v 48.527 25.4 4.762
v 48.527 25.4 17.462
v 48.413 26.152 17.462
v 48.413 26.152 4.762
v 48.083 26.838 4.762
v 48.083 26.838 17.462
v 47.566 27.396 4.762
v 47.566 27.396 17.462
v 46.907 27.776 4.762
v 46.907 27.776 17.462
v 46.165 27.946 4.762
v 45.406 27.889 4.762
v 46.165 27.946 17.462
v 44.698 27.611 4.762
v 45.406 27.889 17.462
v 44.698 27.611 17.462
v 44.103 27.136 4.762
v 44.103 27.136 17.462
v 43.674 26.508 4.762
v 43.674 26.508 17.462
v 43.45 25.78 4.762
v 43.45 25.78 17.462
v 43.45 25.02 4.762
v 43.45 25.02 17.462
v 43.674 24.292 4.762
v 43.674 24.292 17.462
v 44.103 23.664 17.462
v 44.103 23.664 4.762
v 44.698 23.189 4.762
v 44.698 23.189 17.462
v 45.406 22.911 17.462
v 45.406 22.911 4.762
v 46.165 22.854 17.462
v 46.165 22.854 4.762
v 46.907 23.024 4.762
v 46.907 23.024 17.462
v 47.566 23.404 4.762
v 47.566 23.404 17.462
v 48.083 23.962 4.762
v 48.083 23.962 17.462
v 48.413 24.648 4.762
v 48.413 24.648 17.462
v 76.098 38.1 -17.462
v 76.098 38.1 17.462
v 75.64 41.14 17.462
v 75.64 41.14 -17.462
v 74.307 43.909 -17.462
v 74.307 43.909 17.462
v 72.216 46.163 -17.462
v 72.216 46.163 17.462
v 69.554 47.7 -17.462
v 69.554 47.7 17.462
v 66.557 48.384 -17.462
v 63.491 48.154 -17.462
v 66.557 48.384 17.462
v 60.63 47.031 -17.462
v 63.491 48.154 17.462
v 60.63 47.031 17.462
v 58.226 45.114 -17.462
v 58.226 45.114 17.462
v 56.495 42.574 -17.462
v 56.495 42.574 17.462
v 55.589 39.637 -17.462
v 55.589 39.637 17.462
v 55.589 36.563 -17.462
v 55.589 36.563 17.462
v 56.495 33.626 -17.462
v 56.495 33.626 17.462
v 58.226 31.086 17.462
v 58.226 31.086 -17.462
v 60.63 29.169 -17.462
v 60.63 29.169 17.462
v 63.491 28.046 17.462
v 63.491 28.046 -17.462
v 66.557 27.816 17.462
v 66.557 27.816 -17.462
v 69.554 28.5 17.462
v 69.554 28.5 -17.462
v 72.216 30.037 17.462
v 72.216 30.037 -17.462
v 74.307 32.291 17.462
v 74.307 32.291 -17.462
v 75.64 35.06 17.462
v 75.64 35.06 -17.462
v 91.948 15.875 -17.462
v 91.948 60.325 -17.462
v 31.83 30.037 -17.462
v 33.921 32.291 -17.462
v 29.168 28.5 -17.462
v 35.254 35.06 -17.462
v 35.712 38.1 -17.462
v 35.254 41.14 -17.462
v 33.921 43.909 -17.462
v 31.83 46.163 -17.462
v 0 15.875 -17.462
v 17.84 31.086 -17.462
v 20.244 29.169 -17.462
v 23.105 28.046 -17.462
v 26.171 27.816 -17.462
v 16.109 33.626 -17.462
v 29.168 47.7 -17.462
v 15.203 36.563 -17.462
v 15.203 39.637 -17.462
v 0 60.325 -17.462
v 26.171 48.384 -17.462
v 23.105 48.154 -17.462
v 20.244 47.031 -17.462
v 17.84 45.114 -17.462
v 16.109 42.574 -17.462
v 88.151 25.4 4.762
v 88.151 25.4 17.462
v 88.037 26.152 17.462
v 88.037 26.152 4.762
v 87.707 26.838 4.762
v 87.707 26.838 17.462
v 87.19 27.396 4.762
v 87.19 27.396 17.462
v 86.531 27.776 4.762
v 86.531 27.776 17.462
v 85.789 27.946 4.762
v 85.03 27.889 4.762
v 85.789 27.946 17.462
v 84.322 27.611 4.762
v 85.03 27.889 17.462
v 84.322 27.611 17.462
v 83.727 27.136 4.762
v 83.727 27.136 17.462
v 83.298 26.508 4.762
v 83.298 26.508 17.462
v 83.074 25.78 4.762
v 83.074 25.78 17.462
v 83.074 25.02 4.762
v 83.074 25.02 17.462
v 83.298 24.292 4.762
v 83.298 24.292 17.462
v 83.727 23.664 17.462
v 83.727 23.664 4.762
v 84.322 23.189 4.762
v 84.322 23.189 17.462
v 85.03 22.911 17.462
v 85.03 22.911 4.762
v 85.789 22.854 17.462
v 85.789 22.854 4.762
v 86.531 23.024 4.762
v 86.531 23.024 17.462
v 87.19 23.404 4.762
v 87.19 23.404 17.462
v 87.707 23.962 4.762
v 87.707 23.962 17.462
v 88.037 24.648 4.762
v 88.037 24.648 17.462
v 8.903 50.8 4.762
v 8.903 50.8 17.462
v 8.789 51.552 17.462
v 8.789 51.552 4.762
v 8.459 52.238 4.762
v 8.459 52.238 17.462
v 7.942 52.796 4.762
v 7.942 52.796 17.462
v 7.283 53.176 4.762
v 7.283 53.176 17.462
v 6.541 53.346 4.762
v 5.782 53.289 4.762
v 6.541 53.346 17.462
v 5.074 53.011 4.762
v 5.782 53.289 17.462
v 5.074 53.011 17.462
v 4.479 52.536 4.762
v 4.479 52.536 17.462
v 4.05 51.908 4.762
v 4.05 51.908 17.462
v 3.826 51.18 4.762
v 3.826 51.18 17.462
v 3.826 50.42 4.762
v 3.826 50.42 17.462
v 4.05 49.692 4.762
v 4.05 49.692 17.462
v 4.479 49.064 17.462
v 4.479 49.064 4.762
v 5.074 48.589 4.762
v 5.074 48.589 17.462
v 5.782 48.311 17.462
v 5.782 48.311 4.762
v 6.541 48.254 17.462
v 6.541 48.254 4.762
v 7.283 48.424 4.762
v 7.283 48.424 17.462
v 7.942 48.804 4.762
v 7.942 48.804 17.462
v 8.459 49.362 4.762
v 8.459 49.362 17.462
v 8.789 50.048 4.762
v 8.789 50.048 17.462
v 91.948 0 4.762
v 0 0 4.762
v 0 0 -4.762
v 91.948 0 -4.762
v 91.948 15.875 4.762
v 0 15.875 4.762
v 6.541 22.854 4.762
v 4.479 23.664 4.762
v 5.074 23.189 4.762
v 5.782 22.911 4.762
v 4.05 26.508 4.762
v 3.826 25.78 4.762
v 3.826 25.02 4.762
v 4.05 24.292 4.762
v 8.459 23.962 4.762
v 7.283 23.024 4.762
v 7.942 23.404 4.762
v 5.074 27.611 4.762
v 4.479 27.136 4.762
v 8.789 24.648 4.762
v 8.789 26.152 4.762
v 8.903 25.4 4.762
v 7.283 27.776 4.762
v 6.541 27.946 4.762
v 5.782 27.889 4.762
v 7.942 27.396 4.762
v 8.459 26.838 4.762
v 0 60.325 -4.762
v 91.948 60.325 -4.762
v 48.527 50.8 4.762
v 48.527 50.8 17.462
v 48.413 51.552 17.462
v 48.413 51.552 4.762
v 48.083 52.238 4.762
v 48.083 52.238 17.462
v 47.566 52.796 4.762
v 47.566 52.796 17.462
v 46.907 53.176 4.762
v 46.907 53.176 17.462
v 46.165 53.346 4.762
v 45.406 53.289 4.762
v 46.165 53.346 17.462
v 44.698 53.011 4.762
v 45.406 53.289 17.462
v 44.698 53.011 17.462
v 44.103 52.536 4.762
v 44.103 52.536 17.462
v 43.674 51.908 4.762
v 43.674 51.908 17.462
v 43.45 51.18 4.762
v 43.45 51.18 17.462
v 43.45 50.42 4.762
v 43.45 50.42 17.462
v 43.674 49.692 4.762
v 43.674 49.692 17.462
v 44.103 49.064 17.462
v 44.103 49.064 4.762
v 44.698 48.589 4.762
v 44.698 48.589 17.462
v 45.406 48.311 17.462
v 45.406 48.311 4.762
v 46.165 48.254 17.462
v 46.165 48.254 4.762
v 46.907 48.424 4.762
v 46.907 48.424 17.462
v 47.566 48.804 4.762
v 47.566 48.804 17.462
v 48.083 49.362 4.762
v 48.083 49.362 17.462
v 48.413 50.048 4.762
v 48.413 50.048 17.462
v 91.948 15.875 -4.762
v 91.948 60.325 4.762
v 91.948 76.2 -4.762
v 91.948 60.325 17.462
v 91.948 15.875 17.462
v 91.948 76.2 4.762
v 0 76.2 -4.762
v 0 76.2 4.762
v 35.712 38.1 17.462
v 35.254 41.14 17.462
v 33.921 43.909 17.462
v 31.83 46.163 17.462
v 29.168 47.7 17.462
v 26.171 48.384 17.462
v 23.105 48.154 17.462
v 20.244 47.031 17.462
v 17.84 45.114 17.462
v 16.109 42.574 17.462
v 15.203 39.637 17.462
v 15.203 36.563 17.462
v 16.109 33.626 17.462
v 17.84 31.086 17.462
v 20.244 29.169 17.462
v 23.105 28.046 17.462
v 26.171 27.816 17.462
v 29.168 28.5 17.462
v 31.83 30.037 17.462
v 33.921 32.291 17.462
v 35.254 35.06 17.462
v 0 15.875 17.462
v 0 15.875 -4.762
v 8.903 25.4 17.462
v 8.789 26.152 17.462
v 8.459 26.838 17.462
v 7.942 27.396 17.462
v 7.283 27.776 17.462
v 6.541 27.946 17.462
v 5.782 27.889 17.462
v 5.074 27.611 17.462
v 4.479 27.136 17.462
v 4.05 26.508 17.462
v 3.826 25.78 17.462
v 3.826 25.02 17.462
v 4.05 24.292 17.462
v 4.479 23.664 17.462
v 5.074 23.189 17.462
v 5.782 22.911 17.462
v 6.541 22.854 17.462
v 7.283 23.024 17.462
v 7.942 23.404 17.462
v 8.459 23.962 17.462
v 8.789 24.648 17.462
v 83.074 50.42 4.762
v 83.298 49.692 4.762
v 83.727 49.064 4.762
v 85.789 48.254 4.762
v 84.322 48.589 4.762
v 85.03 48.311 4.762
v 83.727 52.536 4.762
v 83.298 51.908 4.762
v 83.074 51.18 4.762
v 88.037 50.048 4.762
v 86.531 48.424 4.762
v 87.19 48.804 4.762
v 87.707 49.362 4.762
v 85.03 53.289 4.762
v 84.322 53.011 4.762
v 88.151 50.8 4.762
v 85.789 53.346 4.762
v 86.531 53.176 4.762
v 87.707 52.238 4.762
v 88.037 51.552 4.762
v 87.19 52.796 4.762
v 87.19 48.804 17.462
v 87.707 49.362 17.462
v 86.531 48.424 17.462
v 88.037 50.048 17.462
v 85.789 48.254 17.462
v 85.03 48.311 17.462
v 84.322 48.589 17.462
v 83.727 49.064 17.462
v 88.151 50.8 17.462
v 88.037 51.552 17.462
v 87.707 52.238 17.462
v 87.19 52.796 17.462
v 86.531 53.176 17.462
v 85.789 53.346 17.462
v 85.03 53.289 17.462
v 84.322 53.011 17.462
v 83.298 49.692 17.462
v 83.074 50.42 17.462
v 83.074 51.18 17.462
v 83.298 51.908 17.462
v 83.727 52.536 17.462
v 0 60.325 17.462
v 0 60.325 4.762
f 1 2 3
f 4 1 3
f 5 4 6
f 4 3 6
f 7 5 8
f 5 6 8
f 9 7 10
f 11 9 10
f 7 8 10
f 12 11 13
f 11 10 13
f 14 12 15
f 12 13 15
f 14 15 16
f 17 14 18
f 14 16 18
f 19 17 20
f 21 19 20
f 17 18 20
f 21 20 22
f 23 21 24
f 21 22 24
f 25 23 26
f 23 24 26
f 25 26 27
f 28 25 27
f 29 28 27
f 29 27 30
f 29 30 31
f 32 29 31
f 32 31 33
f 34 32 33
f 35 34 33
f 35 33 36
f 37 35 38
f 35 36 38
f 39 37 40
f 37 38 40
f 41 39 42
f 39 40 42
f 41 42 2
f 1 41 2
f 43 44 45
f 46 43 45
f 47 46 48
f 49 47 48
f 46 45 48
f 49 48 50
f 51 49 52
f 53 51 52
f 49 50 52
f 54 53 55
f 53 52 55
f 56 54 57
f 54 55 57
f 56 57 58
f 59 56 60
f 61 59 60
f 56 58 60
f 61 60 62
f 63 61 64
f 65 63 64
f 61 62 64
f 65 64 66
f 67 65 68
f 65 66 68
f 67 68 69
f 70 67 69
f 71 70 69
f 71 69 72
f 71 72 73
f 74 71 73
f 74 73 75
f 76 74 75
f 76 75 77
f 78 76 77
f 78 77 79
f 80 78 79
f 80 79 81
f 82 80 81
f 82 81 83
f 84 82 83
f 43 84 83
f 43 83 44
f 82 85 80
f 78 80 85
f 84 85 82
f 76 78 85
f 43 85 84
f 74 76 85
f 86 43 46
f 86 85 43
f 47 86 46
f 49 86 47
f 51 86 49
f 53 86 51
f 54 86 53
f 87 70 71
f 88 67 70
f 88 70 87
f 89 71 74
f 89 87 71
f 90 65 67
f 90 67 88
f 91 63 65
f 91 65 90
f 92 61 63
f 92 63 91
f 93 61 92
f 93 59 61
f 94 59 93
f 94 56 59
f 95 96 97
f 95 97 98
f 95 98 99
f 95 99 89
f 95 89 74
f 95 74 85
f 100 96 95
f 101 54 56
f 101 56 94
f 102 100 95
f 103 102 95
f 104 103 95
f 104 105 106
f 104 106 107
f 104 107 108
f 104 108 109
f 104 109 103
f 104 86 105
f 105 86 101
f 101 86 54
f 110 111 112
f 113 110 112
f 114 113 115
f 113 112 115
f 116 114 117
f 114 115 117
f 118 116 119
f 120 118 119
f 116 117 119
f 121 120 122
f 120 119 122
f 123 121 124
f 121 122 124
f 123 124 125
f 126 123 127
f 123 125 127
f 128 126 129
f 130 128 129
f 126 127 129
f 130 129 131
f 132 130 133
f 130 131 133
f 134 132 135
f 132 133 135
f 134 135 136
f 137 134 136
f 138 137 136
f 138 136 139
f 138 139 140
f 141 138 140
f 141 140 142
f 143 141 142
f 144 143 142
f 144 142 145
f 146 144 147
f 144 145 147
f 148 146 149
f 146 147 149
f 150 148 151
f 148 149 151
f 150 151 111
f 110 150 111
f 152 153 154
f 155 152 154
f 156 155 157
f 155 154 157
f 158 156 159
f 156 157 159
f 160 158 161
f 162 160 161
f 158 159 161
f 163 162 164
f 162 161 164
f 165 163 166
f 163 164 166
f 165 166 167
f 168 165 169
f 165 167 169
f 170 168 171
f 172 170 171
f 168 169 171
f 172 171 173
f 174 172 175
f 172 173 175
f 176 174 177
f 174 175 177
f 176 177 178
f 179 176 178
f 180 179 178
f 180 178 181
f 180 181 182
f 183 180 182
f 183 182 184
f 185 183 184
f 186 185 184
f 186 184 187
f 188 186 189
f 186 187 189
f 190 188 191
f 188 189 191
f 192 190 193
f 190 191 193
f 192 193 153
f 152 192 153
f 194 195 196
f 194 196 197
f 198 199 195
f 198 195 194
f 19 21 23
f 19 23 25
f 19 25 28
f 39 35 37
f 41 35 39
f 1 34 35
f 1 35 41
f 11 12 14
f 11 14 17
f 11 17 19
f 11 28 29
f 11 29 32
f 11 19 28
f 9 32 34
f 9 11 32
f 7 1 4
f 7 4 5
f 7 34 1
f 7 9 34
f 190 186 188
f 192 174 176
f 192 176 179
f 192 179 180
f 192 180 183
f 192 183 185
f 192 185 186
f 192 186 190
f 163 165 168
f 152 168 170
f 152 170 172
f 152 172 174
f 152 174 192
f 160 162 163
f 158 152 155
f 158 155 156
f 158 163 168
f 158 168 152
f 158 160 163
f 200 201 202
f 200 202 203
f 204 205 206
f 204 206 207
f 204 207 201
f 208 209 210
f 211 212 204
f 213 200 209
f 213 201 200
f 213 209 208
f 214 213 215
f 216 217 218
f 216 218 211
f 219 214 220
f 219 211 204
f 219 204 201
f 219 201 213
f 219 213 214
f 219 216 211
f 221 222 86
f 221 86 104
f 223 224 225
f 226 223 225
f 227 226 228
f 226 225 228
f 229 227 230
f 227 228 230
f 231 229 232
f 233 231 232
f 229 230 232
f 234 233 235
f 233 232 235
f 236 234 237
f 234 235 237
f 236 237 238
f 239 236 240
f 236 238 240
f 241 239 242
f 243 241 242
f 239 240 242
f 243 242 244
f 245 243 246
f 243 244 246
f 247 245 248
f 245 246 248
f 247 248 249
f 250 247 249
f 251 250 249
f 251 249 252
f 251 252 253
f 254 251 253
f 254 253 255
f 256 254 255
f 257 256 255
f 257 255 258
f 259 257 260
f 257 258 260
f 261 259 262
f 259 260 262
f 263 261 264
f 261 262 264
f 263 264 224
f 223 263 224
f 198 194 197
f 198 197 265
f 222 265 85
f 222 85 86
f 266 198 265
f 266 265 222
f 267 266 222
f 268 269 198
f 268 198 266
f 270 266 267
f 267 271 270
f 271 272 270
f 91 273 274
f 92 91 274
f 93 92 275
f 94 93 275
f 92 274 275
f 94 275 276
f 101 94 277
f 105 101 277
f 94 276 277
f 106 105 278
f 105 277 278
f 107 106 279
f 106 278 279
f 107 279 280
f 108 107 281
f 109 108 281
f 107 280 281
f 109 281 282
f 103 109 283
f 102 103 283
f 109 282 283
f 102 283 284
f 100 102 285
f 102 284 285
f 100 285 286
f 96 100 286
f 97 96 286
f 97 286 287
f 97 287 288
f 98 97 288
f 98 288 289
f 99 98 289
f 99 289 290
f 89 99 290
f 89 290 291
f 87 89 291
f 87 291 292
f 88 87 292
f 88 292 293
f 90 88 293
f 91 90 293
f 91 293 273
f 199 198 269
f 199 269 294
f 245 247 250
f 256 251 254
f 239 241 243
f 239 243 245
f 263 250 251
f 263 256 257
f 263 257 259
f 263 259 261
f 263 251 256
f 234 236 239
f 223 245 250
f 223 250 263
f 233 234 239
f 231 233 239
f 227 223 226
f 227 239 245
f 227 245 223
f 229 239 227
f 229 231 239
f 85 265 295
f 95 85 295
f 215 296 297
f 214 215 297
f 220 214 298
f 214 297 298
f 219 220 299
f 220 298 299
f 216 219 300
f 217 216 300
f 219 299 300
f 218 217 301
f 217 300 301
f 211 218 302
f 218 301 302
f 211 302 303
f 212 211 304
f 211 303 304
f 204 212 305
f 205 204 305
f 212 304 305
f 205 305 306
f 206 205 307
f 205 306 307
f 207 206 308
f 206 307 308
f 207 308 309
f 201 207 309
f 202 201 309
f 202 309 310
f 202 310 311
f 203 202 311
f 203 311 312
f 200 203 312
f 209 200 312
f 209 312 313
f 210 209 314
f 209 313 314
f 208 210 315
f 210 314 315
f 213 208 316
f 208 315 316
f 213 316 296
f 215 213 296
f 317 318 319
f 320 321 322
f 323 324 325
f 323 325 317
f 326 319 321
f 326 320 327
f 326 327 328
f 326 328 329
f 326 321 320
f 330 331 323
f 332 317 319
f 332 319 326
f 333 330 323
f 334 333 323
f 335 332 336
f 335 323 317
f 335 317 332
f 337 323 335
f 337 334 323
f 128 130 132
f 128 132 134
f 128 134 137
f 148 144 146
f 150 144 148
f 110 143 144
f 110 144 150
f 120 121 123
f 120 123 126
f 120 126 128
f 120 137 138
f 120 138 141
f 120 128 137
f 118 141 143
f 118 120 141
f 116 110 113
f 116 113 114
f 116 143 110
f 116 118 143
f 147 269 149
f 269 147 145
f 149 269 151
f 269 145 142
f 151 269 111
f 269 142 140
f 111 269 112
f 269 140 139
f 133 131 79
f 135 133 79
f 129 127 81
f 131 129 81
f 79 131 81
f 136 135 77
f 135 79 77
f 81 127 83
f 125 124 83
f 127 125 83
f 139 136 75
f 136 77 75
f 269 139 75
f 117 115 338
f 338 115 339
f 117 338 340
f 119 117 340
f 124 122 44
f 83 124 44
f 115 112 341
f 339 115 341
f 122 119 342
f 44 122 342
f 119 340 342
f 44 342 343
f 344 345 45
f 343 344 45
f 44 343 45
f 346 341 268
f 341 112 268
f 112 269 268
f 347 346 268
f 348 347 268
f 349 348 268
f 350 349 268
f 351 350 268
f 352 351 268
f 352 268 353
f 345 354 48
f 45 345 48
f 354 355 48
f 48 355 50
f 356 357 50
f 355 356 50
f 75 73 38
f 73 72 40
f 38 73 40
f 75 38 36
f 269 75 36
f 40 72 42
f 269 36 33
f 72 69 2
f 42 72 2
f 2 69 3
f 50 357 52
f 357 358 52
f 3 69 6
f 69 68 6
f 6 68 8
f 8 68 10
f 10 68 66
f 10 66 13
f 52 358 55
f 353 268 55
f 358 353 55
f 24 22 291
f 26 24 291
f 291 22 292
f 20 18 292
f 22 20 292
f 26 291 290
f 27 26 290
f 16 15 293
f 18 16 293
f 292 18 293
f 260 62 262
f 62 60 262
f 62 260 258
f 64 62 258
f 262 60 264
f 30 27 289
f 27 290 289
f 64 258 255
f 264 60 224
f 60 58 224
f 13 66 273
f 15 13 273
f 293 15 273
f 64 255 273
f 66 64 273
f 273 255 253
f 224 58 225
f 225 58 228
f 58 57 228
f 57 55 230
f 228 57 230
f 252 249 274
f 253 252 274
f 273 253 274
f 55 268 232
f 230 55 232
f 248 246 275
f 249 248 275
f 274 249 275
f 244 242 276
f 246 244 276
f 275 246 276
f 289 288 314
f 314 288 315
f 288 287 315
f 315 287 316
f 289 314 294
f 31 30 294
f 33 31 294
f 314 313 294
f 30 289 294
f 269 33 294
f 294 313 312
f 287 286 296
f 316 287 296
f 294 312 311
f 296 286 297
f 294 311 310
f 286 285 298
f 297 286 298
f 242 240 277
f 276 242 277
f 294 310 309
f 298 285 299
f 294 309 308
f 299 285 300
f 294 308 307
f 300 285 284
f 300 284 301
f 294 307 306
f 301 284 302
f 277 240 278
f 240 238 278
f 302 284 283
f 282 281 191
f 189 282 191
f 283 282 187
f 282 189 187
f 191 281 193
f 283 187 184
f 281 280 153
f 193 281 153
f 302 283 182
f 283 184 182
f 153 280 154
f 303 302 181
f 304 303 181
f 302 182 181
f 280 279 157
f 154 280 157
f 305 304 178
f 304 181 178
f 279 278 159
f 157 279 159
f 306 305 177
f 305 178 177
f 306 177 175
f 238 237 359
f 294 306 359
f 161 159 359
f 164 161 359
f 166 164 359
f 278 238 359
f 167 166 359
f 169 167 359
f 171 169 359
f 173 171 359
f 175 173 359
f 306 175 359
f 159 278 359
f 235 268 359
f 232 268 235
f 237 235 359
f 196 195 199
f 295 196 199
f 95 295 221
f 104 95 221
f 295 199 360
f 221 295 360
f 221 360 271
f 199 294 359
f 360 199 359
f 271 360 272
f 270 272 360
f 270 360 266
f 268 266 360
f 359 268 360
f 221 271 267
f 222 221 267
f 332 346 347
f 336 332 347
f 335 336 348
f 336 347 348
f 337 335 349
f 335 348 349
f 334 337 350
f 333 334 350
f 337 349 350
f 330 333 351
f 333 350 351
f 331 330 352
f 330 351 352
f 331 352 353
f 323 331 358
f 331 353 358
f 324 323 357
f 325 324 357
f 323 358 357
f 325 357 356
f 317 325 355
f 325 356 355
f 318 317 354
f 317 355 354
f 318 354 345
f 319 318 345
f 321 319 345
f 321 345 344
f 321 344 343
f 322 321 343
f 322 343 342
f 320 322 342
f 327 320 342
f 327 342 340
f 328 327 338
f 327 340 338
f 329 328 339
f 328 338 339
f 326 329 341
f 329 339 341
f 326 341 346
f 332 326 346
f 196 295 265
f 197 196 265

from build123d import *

# Parameters (mm, degrees)
SKETCH1_W           = 91.948
SKETCH1_H           = 76.2
BOSS_EXTRUDE1_DEPTH = 4.7625
BOSS_EXTRUDE2_START = -4.7625
SKETCH2_W           = 91.948
SKETCH2_H           = 44.45
BOSS_EXTRUDE2_DEPTH = 12.7
SKETCH3_R           = 10.3124
CUT_EXTRUDE6_DEPTH  = 125.421181191
SKETCH4_R           = 2.5527
CUT_EXTRUDE7_DEPTH  = 12.7


with BuildPart() as part:
    # Sketch1 → Boss-Extrude1 (new body)
    with BuildSketch(Plane.XY):
        with Locations((45.974, 38.1)):
            Rectangle(SKETCH1_W, SKETCH1_H)
    boss_extrude1 = extrude(amount=BOSS_EXTRUDE1_DEPTH)

    # Sketch2 → Boss-Extrude2 (add)
    with BuildSketch(Plane(origin=(0, 0, 0), x_dir=(-1, 0, 0), z_dir=(0, 0, -1)).offset(BOSS_EXTRUDE2_START)):
        with Locations((-45.974, 38.1)):
            Rectangle(SKETCH2_W, SKETCH2_H)
    boss_extrude2 = extrude(amount=-BOSS_EXTRUDE2_DEPTH)

    # Mirror1: Boss-Extrude1, Boss-Extrude2 across plane
    add(boss_extrude1.mirror(Plane.XY))
    add(boss_extrude2.mirror(Plane.XY))

    # Sketch3 → Cut-Extrude6 (cut, through all)
    with BuildSketch(Plane.XY.offset(17.4625)):
        with Locations((25.4, 38.1)):
            Circle(SKETCH3_R)
        with Locations((65.786, 38.1)):
            Circle(SKETCH3_R)
    extrude(amount=-CUT_EXTRUDE6_DEPTH, mode=Mode.SUBTRACT)

    # Sketch4 → Cut-Extrude7 (cut)
    with BuildSketch(Plane.XY.offset(17.4625)):
        with Locations((6.35, 50.8)):
            Circle(SKETCH4_R)
        with Locations((6.35, 25.4)):
            Circle(SKETCH4_R)
        with Locations((45.974, 25.4)):
            Circle(SKETCH4_R)
        with Locations((45.974, 50.8)):
            Circle(SKETCH4_R)
        with Locations((85.598, 50.8)):
            Circle(SKETCH4_R)
        with Locations((85.598, 25.4)):
            Circle(SKETCH4_R)
    extrude(amount=-CUT_EXTRUDE7_DEPTH, mode=Mode.SUBTRACT)


solid = part.part
